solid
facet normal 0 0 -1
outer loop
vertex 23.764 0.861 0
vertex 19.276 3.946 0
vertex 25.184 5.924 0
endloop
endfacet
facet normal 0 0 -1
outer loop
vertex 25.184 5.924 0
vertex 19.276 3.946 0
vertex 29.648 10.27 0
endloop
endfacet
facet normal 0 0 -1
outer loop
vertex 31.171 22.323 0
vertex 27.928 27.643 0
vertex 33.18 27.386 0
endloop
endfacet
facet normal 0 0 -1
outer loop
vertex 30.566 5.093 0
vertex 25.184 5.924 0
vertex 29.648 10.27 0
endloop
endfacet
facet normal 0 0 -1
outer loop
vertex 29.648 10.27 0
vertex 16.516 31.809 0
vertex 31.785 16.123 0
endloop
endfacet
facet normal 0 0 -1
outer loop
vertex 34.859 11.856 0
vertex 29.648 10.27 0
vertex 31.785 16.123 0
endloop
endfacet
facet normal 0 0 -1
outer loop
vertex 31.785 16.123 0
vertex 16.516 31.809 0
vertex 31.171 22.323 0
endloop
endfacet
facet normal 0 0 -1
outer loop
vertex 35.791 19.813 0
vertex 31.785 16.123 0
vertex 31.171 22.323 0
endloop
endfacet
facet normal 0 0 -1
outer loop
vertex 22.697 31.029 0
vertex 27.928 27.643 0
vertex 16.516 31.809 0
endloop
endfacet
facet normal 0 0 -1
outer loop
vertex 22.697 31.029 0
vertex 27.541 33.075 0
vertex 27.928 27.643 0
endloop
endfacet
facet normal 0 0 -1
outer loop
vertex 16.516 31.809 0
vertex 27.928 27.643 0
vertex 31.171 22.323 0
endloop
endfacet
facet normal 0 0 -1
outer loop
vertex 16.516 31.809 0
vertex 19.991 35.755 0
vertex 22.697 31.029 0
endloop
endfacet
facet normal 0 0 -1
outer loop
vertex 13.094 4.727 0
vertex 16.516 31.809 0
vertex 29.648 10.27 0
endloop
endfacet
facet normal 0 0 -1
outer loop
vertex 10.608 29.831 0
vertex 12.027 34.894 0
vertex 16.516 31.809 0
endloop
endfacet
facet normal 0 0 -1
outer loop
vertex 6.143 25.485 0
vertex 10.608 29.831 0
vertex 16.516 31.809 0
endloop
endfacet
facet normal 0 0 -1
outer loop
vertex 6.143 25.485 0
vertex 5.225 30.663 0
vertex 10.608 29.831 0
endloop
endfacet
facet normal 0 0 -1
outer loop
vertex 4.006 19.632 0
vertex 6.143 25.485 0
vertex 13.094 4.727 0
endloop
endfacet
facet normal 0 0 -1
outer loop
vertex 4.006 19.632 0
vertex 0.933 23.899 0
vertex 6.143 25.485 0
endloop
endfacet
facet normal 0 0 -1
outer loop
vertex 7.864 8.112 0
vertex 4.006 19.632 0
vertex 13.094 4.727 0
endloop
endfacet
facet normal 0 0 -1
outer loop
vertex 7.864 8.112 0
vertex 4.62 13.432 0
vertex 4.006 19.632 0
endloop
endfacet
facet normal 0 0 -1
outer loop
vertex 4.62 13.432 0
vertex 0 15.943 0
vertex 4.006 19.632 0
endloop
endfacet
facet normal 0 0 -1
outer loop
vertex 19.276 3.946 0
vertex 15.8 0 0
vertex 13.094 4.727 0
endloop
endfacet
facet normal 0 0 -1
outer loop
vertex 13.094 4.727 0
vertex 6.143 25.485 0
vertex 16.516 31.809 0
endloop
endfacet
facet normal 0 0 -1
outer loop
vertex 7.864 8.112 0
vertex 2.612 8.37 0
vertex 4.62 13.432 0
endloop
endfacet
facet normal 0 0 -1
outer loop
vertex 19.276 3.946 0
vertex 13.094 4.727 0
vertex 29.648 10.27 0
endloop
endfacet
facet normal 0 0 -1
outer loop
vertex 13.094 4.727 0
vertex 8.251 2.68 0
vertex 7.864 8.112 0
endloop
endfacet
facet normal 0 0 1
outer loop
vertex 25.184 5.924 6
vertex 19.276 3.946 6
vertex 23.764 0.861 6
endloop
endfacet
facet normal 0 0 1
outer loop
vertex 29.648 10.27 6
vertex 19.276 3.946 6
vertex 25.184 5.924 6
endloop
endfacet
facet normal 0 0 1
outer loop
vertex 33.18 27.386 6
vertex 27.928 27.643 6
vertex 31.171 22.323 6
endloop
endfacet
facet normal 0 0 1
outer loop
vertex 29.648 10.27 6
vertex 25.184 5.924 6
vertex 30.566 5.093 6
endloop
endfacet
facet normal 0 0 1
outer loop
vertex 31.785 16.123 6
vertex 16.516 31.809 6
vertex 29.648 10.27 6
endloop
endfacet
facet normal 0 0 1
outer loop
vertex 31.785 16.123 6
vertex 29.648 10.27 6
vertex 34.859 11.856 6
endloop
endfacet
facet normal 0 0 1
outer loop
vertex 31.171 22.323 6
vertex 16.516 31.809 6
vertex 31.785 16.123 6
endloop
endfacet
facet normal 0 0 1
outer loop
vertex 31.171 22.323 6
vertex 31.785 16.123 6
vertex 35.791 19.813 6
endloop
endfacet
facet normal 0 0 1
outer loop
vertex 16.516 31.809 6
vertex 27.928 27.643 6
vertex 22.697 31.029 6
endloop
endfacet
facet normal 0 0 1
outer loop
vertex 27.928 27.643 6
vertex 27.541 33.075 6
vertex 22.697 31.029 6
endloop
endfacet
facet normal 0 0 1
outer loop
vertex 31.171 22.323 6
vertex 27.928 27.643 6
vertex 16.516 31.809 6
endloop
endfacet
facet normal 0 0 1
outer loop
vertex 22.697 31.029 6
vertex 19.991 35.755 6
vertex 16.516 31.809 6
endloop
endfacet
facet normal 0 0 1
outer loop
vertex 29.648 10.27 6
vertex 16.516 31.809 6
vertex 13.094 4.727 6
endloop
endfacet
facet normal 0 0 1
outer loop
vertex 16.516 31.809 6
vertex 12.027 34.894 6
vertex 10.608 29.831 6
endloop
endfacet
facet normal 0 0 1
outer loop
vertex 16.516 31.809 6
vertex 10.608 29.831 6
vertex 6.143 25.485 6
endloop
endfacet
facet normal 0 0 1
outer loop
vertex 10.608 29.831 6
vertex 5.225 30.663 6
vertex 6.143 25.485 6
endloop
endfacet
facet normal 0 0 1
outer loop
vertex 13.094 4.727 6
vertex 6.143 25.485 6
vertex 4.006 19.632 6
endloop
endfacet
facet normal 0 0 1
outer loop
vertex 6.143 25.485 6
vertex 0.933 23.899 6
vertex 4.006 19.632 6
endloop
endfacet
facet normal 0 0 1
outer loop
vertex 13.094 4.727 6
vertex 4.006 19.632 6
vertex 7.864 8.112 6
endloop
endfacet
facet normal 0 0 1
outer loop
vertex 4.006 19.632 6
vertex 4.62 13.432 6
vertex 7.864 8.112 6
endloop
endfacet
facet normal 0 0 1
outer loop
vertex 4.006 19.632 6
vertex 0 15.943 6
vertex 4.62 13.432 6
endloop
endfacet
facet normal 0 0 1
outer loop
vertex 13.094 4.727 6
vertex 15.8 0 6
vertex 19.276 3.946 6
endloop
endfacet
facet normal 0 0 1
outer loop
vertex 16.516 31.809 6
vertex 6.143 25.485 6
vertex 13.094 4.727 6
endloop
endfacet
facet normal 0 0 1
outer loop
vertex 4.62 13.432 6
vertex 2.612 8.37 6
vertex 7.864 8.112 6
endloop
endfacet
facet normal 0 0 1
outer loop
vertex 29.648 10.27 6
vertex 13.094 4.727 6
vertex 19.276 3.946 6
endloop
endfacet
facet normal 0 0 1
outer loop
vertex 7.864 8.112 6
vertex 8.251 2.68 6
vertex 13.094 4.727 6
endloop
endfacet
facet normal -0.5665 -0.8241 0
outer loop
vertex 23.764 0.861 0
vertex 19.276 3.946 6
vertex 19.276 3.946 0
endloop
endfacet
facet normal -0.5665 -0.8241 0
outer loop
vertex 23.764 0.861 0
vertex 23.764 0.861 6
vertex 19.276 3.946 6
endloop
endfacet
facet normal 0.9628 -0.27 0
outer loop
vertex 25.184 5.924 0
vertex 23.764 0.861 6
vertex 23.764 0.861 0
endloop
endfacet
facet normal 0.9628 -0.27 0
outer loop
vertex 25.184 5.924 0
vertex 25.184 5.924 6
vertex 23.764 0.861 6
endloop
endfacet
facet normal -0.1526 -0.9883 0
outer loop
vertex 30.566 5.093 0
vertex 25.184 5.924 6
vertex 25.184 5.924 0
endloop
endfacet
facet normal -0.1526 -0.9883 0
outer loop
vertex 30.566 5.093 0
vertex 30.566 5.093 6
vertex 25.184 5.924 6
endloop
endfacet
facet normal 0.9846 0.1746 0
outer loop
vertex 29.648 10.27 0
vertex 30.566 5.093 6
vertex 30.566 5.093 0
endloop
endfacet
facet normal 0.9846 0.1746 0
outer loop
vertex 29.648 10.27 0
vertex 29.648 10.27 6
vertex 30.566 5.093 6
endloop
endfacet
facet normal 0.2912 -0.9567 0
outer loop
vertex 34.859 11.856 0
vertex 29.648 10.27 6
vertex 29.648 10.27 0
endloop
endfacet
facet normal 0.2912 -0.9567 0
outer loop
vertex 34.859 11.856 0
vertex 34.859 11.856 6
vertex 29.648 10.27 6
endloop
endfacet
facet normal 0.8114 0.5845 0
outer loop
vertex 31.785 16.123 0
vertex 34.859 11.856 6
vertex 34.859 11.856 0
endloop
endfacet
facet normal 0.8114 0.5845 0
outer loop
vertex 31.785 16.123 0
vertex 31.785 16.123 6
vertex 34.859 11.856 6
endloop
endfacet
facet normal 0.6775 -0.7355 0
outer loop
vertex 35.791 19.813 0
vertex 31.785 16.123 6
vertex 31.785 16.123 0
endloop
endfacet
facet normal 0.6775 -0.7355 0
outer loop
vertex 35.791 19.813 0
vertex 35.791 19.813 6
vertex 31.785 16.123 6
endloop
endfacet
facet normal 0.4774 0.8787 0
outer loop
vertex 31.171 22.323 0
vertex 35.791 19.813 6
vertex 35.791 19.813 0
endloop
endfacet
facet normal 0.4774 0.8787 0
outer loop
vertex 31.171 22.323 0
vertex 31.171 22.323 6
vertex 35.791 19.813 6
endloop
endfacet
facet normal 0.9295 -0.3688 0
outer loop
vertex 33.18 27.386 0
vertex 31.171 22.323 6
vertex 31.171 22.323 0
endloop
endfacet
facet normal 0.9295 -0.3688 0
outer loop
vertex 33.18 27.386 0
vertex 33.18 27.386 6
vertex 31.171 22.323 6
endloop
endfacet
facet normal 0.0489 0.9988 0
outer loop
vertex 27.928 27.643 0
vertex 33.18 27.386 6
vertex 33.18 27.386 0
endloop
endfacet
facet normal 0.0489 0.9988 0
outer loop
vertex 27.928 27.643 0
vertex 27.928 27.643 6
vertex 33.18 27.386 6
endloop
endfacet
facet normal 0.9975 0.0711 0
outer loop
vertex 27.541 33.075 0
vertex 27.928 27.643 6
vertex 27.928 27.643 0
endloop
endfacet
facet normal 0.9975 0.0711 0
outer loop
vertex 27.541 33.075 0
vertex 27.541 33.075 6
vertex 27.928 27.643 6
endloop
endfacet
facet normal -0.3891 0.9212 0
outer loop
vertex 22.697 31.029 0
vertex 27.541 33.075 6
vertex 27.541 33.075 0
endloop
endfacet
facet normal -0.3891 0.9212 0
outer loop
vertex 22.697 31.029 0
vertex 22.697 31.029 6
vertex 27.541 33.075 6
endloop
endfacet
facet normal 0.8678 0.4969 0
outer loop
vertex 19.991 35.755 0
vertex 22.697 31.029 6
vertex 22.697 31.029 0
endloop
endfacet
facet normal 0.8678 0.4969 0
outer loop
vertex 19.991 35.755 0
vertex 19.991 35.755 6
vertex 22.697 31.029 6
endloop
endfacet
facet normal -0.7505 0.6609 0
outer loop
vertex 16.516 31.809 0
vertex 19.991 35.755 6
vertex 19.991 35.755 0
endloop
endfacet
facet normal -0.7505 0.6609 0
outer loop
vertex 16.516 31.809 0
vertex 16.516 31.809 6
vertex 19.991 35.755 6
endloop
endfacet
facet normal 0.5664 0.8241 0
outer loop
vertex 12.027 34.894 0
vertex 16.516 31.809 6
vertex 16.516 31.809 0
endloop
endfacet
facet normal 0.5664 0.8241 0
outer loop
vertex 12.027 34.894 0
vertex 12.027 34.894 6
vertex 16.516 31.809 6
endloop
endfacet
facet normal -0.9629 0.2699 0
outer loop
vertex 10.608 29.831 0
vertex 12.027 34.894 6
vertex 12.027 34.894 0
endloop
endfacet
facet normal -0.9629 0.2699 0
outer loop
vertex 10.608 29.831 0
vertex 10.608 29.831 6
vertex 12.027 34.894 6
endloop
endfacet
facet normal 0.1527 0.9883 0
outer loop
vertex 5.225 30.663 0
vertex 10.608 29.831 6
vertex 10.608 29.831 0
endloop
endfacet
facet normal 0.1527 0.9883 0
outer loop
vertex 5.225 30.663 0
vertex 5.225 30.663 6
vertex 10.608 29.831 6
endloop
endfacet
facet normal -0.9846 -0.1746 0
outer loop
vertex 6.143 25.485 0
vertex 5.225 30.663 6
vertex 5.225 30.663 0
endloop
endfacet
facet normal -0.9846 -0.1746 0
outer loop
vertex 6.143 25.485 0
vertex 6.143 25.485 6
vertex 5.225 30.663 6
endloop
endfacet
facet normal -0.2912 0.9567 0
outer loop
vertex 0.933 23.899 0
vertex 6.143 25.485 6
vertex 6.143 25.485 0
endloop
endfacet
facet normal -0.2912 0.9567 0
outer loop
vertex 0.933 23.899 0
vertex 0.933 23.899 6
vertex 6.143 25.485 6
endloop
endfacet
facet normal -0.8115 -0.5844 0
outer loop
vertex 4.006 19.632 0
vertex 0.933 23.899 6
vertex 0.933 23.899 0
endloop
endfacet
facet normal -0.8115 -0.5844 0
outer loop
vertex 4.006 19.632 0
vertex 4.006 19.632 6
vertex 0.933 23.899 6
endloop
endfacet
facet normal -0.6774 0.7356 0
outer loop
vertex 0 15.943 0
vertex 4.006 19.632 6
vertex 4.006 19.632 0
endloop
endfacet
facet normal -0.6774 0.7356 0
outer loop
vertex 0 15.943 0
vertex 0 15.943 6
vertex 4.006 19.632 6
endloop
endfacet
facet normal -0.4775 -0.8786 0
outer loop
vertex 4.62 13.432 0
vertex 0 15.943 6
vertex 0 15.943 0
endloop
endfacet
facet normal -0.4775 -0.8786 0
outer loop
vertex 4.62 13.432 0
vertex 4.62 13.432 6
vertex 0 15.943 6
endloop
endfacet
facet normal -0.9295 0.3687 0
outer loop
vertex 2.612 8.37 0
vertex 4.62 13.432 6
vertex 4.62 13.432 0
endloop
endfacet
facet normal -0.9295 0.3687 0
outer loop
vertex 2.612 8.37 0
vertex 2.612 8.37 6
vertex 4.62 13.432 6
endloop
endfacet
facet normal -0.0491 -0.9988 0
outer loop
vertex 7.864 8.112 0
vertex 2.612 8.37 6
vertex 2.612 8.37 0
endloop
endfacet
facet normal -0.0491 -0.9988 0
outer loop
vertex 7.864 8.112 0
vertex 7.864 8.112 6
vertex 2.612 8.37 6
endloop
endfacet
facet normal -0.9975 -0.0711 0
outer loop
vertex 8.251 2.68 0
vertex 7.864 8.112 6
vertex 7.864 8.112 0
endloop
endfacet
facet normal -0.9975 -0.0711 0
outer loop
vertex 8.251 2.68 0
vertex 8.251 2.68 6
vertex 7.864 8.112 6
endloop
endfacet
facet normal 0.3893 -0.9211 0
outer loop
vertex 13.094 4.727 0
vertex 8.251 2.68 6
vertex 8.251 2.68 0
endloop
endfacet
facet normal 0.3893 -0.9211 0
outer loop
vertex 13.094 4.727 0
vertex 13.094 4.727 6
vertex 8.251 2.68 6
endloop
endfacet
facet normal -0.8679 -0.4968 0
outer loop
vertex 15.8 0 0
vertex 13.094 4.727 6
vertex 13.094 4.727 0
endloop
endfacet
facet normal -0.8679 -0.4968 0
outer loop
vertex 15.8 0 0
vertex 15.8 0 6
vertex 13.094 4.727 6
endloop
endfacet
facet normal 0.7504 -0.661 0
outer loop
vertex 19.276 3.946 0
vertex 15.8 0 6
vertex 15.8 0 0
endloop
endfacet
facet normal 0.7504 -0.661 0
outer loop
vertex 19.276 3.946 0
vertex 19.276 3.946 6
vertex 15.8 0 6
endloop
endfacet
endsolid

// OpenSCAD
$fn = 32;

// ----------------------------------------------------------------------
// Chain sprocket: 14 teeth, 14 mm root radius
// ----------------------------------------------------------------------

// --- parameters (mm) ---
profile_height = 6;       // extrusion height
profile_points = 28;      // points of the closed outline

profile = [[31.785, 16.123], [35.791, 19.813], [31.171, 22.323], [33.18, 27.386], [27.928, 27.643], [27.541, 33.075], [22.697, 31.029], [19.991, 35.755], [16.516, 31.809], [12.027, 34.894], [10.608, 29.831], [5.225, 30.663], [6.143, 25.485], [0.933, 23.899], [4.006, 19.632], [0, 15.943], [4.62, 13.432], [2.612, 8.37], [7.864, 8.112], [8.251, 2.68], [13.094, 4.727], [15.8, 0], [19.276, 3.946], [23.764, 0.861], [25.184, 5.924], [30.566, 5.093], [29.648, 10.27], [34.859, 11.856]];  // single closed polygon, 28 points, counter clockwise

// --- the one profile operation ---
linear_extrude(height = profile_height) polygon(points = profile);
